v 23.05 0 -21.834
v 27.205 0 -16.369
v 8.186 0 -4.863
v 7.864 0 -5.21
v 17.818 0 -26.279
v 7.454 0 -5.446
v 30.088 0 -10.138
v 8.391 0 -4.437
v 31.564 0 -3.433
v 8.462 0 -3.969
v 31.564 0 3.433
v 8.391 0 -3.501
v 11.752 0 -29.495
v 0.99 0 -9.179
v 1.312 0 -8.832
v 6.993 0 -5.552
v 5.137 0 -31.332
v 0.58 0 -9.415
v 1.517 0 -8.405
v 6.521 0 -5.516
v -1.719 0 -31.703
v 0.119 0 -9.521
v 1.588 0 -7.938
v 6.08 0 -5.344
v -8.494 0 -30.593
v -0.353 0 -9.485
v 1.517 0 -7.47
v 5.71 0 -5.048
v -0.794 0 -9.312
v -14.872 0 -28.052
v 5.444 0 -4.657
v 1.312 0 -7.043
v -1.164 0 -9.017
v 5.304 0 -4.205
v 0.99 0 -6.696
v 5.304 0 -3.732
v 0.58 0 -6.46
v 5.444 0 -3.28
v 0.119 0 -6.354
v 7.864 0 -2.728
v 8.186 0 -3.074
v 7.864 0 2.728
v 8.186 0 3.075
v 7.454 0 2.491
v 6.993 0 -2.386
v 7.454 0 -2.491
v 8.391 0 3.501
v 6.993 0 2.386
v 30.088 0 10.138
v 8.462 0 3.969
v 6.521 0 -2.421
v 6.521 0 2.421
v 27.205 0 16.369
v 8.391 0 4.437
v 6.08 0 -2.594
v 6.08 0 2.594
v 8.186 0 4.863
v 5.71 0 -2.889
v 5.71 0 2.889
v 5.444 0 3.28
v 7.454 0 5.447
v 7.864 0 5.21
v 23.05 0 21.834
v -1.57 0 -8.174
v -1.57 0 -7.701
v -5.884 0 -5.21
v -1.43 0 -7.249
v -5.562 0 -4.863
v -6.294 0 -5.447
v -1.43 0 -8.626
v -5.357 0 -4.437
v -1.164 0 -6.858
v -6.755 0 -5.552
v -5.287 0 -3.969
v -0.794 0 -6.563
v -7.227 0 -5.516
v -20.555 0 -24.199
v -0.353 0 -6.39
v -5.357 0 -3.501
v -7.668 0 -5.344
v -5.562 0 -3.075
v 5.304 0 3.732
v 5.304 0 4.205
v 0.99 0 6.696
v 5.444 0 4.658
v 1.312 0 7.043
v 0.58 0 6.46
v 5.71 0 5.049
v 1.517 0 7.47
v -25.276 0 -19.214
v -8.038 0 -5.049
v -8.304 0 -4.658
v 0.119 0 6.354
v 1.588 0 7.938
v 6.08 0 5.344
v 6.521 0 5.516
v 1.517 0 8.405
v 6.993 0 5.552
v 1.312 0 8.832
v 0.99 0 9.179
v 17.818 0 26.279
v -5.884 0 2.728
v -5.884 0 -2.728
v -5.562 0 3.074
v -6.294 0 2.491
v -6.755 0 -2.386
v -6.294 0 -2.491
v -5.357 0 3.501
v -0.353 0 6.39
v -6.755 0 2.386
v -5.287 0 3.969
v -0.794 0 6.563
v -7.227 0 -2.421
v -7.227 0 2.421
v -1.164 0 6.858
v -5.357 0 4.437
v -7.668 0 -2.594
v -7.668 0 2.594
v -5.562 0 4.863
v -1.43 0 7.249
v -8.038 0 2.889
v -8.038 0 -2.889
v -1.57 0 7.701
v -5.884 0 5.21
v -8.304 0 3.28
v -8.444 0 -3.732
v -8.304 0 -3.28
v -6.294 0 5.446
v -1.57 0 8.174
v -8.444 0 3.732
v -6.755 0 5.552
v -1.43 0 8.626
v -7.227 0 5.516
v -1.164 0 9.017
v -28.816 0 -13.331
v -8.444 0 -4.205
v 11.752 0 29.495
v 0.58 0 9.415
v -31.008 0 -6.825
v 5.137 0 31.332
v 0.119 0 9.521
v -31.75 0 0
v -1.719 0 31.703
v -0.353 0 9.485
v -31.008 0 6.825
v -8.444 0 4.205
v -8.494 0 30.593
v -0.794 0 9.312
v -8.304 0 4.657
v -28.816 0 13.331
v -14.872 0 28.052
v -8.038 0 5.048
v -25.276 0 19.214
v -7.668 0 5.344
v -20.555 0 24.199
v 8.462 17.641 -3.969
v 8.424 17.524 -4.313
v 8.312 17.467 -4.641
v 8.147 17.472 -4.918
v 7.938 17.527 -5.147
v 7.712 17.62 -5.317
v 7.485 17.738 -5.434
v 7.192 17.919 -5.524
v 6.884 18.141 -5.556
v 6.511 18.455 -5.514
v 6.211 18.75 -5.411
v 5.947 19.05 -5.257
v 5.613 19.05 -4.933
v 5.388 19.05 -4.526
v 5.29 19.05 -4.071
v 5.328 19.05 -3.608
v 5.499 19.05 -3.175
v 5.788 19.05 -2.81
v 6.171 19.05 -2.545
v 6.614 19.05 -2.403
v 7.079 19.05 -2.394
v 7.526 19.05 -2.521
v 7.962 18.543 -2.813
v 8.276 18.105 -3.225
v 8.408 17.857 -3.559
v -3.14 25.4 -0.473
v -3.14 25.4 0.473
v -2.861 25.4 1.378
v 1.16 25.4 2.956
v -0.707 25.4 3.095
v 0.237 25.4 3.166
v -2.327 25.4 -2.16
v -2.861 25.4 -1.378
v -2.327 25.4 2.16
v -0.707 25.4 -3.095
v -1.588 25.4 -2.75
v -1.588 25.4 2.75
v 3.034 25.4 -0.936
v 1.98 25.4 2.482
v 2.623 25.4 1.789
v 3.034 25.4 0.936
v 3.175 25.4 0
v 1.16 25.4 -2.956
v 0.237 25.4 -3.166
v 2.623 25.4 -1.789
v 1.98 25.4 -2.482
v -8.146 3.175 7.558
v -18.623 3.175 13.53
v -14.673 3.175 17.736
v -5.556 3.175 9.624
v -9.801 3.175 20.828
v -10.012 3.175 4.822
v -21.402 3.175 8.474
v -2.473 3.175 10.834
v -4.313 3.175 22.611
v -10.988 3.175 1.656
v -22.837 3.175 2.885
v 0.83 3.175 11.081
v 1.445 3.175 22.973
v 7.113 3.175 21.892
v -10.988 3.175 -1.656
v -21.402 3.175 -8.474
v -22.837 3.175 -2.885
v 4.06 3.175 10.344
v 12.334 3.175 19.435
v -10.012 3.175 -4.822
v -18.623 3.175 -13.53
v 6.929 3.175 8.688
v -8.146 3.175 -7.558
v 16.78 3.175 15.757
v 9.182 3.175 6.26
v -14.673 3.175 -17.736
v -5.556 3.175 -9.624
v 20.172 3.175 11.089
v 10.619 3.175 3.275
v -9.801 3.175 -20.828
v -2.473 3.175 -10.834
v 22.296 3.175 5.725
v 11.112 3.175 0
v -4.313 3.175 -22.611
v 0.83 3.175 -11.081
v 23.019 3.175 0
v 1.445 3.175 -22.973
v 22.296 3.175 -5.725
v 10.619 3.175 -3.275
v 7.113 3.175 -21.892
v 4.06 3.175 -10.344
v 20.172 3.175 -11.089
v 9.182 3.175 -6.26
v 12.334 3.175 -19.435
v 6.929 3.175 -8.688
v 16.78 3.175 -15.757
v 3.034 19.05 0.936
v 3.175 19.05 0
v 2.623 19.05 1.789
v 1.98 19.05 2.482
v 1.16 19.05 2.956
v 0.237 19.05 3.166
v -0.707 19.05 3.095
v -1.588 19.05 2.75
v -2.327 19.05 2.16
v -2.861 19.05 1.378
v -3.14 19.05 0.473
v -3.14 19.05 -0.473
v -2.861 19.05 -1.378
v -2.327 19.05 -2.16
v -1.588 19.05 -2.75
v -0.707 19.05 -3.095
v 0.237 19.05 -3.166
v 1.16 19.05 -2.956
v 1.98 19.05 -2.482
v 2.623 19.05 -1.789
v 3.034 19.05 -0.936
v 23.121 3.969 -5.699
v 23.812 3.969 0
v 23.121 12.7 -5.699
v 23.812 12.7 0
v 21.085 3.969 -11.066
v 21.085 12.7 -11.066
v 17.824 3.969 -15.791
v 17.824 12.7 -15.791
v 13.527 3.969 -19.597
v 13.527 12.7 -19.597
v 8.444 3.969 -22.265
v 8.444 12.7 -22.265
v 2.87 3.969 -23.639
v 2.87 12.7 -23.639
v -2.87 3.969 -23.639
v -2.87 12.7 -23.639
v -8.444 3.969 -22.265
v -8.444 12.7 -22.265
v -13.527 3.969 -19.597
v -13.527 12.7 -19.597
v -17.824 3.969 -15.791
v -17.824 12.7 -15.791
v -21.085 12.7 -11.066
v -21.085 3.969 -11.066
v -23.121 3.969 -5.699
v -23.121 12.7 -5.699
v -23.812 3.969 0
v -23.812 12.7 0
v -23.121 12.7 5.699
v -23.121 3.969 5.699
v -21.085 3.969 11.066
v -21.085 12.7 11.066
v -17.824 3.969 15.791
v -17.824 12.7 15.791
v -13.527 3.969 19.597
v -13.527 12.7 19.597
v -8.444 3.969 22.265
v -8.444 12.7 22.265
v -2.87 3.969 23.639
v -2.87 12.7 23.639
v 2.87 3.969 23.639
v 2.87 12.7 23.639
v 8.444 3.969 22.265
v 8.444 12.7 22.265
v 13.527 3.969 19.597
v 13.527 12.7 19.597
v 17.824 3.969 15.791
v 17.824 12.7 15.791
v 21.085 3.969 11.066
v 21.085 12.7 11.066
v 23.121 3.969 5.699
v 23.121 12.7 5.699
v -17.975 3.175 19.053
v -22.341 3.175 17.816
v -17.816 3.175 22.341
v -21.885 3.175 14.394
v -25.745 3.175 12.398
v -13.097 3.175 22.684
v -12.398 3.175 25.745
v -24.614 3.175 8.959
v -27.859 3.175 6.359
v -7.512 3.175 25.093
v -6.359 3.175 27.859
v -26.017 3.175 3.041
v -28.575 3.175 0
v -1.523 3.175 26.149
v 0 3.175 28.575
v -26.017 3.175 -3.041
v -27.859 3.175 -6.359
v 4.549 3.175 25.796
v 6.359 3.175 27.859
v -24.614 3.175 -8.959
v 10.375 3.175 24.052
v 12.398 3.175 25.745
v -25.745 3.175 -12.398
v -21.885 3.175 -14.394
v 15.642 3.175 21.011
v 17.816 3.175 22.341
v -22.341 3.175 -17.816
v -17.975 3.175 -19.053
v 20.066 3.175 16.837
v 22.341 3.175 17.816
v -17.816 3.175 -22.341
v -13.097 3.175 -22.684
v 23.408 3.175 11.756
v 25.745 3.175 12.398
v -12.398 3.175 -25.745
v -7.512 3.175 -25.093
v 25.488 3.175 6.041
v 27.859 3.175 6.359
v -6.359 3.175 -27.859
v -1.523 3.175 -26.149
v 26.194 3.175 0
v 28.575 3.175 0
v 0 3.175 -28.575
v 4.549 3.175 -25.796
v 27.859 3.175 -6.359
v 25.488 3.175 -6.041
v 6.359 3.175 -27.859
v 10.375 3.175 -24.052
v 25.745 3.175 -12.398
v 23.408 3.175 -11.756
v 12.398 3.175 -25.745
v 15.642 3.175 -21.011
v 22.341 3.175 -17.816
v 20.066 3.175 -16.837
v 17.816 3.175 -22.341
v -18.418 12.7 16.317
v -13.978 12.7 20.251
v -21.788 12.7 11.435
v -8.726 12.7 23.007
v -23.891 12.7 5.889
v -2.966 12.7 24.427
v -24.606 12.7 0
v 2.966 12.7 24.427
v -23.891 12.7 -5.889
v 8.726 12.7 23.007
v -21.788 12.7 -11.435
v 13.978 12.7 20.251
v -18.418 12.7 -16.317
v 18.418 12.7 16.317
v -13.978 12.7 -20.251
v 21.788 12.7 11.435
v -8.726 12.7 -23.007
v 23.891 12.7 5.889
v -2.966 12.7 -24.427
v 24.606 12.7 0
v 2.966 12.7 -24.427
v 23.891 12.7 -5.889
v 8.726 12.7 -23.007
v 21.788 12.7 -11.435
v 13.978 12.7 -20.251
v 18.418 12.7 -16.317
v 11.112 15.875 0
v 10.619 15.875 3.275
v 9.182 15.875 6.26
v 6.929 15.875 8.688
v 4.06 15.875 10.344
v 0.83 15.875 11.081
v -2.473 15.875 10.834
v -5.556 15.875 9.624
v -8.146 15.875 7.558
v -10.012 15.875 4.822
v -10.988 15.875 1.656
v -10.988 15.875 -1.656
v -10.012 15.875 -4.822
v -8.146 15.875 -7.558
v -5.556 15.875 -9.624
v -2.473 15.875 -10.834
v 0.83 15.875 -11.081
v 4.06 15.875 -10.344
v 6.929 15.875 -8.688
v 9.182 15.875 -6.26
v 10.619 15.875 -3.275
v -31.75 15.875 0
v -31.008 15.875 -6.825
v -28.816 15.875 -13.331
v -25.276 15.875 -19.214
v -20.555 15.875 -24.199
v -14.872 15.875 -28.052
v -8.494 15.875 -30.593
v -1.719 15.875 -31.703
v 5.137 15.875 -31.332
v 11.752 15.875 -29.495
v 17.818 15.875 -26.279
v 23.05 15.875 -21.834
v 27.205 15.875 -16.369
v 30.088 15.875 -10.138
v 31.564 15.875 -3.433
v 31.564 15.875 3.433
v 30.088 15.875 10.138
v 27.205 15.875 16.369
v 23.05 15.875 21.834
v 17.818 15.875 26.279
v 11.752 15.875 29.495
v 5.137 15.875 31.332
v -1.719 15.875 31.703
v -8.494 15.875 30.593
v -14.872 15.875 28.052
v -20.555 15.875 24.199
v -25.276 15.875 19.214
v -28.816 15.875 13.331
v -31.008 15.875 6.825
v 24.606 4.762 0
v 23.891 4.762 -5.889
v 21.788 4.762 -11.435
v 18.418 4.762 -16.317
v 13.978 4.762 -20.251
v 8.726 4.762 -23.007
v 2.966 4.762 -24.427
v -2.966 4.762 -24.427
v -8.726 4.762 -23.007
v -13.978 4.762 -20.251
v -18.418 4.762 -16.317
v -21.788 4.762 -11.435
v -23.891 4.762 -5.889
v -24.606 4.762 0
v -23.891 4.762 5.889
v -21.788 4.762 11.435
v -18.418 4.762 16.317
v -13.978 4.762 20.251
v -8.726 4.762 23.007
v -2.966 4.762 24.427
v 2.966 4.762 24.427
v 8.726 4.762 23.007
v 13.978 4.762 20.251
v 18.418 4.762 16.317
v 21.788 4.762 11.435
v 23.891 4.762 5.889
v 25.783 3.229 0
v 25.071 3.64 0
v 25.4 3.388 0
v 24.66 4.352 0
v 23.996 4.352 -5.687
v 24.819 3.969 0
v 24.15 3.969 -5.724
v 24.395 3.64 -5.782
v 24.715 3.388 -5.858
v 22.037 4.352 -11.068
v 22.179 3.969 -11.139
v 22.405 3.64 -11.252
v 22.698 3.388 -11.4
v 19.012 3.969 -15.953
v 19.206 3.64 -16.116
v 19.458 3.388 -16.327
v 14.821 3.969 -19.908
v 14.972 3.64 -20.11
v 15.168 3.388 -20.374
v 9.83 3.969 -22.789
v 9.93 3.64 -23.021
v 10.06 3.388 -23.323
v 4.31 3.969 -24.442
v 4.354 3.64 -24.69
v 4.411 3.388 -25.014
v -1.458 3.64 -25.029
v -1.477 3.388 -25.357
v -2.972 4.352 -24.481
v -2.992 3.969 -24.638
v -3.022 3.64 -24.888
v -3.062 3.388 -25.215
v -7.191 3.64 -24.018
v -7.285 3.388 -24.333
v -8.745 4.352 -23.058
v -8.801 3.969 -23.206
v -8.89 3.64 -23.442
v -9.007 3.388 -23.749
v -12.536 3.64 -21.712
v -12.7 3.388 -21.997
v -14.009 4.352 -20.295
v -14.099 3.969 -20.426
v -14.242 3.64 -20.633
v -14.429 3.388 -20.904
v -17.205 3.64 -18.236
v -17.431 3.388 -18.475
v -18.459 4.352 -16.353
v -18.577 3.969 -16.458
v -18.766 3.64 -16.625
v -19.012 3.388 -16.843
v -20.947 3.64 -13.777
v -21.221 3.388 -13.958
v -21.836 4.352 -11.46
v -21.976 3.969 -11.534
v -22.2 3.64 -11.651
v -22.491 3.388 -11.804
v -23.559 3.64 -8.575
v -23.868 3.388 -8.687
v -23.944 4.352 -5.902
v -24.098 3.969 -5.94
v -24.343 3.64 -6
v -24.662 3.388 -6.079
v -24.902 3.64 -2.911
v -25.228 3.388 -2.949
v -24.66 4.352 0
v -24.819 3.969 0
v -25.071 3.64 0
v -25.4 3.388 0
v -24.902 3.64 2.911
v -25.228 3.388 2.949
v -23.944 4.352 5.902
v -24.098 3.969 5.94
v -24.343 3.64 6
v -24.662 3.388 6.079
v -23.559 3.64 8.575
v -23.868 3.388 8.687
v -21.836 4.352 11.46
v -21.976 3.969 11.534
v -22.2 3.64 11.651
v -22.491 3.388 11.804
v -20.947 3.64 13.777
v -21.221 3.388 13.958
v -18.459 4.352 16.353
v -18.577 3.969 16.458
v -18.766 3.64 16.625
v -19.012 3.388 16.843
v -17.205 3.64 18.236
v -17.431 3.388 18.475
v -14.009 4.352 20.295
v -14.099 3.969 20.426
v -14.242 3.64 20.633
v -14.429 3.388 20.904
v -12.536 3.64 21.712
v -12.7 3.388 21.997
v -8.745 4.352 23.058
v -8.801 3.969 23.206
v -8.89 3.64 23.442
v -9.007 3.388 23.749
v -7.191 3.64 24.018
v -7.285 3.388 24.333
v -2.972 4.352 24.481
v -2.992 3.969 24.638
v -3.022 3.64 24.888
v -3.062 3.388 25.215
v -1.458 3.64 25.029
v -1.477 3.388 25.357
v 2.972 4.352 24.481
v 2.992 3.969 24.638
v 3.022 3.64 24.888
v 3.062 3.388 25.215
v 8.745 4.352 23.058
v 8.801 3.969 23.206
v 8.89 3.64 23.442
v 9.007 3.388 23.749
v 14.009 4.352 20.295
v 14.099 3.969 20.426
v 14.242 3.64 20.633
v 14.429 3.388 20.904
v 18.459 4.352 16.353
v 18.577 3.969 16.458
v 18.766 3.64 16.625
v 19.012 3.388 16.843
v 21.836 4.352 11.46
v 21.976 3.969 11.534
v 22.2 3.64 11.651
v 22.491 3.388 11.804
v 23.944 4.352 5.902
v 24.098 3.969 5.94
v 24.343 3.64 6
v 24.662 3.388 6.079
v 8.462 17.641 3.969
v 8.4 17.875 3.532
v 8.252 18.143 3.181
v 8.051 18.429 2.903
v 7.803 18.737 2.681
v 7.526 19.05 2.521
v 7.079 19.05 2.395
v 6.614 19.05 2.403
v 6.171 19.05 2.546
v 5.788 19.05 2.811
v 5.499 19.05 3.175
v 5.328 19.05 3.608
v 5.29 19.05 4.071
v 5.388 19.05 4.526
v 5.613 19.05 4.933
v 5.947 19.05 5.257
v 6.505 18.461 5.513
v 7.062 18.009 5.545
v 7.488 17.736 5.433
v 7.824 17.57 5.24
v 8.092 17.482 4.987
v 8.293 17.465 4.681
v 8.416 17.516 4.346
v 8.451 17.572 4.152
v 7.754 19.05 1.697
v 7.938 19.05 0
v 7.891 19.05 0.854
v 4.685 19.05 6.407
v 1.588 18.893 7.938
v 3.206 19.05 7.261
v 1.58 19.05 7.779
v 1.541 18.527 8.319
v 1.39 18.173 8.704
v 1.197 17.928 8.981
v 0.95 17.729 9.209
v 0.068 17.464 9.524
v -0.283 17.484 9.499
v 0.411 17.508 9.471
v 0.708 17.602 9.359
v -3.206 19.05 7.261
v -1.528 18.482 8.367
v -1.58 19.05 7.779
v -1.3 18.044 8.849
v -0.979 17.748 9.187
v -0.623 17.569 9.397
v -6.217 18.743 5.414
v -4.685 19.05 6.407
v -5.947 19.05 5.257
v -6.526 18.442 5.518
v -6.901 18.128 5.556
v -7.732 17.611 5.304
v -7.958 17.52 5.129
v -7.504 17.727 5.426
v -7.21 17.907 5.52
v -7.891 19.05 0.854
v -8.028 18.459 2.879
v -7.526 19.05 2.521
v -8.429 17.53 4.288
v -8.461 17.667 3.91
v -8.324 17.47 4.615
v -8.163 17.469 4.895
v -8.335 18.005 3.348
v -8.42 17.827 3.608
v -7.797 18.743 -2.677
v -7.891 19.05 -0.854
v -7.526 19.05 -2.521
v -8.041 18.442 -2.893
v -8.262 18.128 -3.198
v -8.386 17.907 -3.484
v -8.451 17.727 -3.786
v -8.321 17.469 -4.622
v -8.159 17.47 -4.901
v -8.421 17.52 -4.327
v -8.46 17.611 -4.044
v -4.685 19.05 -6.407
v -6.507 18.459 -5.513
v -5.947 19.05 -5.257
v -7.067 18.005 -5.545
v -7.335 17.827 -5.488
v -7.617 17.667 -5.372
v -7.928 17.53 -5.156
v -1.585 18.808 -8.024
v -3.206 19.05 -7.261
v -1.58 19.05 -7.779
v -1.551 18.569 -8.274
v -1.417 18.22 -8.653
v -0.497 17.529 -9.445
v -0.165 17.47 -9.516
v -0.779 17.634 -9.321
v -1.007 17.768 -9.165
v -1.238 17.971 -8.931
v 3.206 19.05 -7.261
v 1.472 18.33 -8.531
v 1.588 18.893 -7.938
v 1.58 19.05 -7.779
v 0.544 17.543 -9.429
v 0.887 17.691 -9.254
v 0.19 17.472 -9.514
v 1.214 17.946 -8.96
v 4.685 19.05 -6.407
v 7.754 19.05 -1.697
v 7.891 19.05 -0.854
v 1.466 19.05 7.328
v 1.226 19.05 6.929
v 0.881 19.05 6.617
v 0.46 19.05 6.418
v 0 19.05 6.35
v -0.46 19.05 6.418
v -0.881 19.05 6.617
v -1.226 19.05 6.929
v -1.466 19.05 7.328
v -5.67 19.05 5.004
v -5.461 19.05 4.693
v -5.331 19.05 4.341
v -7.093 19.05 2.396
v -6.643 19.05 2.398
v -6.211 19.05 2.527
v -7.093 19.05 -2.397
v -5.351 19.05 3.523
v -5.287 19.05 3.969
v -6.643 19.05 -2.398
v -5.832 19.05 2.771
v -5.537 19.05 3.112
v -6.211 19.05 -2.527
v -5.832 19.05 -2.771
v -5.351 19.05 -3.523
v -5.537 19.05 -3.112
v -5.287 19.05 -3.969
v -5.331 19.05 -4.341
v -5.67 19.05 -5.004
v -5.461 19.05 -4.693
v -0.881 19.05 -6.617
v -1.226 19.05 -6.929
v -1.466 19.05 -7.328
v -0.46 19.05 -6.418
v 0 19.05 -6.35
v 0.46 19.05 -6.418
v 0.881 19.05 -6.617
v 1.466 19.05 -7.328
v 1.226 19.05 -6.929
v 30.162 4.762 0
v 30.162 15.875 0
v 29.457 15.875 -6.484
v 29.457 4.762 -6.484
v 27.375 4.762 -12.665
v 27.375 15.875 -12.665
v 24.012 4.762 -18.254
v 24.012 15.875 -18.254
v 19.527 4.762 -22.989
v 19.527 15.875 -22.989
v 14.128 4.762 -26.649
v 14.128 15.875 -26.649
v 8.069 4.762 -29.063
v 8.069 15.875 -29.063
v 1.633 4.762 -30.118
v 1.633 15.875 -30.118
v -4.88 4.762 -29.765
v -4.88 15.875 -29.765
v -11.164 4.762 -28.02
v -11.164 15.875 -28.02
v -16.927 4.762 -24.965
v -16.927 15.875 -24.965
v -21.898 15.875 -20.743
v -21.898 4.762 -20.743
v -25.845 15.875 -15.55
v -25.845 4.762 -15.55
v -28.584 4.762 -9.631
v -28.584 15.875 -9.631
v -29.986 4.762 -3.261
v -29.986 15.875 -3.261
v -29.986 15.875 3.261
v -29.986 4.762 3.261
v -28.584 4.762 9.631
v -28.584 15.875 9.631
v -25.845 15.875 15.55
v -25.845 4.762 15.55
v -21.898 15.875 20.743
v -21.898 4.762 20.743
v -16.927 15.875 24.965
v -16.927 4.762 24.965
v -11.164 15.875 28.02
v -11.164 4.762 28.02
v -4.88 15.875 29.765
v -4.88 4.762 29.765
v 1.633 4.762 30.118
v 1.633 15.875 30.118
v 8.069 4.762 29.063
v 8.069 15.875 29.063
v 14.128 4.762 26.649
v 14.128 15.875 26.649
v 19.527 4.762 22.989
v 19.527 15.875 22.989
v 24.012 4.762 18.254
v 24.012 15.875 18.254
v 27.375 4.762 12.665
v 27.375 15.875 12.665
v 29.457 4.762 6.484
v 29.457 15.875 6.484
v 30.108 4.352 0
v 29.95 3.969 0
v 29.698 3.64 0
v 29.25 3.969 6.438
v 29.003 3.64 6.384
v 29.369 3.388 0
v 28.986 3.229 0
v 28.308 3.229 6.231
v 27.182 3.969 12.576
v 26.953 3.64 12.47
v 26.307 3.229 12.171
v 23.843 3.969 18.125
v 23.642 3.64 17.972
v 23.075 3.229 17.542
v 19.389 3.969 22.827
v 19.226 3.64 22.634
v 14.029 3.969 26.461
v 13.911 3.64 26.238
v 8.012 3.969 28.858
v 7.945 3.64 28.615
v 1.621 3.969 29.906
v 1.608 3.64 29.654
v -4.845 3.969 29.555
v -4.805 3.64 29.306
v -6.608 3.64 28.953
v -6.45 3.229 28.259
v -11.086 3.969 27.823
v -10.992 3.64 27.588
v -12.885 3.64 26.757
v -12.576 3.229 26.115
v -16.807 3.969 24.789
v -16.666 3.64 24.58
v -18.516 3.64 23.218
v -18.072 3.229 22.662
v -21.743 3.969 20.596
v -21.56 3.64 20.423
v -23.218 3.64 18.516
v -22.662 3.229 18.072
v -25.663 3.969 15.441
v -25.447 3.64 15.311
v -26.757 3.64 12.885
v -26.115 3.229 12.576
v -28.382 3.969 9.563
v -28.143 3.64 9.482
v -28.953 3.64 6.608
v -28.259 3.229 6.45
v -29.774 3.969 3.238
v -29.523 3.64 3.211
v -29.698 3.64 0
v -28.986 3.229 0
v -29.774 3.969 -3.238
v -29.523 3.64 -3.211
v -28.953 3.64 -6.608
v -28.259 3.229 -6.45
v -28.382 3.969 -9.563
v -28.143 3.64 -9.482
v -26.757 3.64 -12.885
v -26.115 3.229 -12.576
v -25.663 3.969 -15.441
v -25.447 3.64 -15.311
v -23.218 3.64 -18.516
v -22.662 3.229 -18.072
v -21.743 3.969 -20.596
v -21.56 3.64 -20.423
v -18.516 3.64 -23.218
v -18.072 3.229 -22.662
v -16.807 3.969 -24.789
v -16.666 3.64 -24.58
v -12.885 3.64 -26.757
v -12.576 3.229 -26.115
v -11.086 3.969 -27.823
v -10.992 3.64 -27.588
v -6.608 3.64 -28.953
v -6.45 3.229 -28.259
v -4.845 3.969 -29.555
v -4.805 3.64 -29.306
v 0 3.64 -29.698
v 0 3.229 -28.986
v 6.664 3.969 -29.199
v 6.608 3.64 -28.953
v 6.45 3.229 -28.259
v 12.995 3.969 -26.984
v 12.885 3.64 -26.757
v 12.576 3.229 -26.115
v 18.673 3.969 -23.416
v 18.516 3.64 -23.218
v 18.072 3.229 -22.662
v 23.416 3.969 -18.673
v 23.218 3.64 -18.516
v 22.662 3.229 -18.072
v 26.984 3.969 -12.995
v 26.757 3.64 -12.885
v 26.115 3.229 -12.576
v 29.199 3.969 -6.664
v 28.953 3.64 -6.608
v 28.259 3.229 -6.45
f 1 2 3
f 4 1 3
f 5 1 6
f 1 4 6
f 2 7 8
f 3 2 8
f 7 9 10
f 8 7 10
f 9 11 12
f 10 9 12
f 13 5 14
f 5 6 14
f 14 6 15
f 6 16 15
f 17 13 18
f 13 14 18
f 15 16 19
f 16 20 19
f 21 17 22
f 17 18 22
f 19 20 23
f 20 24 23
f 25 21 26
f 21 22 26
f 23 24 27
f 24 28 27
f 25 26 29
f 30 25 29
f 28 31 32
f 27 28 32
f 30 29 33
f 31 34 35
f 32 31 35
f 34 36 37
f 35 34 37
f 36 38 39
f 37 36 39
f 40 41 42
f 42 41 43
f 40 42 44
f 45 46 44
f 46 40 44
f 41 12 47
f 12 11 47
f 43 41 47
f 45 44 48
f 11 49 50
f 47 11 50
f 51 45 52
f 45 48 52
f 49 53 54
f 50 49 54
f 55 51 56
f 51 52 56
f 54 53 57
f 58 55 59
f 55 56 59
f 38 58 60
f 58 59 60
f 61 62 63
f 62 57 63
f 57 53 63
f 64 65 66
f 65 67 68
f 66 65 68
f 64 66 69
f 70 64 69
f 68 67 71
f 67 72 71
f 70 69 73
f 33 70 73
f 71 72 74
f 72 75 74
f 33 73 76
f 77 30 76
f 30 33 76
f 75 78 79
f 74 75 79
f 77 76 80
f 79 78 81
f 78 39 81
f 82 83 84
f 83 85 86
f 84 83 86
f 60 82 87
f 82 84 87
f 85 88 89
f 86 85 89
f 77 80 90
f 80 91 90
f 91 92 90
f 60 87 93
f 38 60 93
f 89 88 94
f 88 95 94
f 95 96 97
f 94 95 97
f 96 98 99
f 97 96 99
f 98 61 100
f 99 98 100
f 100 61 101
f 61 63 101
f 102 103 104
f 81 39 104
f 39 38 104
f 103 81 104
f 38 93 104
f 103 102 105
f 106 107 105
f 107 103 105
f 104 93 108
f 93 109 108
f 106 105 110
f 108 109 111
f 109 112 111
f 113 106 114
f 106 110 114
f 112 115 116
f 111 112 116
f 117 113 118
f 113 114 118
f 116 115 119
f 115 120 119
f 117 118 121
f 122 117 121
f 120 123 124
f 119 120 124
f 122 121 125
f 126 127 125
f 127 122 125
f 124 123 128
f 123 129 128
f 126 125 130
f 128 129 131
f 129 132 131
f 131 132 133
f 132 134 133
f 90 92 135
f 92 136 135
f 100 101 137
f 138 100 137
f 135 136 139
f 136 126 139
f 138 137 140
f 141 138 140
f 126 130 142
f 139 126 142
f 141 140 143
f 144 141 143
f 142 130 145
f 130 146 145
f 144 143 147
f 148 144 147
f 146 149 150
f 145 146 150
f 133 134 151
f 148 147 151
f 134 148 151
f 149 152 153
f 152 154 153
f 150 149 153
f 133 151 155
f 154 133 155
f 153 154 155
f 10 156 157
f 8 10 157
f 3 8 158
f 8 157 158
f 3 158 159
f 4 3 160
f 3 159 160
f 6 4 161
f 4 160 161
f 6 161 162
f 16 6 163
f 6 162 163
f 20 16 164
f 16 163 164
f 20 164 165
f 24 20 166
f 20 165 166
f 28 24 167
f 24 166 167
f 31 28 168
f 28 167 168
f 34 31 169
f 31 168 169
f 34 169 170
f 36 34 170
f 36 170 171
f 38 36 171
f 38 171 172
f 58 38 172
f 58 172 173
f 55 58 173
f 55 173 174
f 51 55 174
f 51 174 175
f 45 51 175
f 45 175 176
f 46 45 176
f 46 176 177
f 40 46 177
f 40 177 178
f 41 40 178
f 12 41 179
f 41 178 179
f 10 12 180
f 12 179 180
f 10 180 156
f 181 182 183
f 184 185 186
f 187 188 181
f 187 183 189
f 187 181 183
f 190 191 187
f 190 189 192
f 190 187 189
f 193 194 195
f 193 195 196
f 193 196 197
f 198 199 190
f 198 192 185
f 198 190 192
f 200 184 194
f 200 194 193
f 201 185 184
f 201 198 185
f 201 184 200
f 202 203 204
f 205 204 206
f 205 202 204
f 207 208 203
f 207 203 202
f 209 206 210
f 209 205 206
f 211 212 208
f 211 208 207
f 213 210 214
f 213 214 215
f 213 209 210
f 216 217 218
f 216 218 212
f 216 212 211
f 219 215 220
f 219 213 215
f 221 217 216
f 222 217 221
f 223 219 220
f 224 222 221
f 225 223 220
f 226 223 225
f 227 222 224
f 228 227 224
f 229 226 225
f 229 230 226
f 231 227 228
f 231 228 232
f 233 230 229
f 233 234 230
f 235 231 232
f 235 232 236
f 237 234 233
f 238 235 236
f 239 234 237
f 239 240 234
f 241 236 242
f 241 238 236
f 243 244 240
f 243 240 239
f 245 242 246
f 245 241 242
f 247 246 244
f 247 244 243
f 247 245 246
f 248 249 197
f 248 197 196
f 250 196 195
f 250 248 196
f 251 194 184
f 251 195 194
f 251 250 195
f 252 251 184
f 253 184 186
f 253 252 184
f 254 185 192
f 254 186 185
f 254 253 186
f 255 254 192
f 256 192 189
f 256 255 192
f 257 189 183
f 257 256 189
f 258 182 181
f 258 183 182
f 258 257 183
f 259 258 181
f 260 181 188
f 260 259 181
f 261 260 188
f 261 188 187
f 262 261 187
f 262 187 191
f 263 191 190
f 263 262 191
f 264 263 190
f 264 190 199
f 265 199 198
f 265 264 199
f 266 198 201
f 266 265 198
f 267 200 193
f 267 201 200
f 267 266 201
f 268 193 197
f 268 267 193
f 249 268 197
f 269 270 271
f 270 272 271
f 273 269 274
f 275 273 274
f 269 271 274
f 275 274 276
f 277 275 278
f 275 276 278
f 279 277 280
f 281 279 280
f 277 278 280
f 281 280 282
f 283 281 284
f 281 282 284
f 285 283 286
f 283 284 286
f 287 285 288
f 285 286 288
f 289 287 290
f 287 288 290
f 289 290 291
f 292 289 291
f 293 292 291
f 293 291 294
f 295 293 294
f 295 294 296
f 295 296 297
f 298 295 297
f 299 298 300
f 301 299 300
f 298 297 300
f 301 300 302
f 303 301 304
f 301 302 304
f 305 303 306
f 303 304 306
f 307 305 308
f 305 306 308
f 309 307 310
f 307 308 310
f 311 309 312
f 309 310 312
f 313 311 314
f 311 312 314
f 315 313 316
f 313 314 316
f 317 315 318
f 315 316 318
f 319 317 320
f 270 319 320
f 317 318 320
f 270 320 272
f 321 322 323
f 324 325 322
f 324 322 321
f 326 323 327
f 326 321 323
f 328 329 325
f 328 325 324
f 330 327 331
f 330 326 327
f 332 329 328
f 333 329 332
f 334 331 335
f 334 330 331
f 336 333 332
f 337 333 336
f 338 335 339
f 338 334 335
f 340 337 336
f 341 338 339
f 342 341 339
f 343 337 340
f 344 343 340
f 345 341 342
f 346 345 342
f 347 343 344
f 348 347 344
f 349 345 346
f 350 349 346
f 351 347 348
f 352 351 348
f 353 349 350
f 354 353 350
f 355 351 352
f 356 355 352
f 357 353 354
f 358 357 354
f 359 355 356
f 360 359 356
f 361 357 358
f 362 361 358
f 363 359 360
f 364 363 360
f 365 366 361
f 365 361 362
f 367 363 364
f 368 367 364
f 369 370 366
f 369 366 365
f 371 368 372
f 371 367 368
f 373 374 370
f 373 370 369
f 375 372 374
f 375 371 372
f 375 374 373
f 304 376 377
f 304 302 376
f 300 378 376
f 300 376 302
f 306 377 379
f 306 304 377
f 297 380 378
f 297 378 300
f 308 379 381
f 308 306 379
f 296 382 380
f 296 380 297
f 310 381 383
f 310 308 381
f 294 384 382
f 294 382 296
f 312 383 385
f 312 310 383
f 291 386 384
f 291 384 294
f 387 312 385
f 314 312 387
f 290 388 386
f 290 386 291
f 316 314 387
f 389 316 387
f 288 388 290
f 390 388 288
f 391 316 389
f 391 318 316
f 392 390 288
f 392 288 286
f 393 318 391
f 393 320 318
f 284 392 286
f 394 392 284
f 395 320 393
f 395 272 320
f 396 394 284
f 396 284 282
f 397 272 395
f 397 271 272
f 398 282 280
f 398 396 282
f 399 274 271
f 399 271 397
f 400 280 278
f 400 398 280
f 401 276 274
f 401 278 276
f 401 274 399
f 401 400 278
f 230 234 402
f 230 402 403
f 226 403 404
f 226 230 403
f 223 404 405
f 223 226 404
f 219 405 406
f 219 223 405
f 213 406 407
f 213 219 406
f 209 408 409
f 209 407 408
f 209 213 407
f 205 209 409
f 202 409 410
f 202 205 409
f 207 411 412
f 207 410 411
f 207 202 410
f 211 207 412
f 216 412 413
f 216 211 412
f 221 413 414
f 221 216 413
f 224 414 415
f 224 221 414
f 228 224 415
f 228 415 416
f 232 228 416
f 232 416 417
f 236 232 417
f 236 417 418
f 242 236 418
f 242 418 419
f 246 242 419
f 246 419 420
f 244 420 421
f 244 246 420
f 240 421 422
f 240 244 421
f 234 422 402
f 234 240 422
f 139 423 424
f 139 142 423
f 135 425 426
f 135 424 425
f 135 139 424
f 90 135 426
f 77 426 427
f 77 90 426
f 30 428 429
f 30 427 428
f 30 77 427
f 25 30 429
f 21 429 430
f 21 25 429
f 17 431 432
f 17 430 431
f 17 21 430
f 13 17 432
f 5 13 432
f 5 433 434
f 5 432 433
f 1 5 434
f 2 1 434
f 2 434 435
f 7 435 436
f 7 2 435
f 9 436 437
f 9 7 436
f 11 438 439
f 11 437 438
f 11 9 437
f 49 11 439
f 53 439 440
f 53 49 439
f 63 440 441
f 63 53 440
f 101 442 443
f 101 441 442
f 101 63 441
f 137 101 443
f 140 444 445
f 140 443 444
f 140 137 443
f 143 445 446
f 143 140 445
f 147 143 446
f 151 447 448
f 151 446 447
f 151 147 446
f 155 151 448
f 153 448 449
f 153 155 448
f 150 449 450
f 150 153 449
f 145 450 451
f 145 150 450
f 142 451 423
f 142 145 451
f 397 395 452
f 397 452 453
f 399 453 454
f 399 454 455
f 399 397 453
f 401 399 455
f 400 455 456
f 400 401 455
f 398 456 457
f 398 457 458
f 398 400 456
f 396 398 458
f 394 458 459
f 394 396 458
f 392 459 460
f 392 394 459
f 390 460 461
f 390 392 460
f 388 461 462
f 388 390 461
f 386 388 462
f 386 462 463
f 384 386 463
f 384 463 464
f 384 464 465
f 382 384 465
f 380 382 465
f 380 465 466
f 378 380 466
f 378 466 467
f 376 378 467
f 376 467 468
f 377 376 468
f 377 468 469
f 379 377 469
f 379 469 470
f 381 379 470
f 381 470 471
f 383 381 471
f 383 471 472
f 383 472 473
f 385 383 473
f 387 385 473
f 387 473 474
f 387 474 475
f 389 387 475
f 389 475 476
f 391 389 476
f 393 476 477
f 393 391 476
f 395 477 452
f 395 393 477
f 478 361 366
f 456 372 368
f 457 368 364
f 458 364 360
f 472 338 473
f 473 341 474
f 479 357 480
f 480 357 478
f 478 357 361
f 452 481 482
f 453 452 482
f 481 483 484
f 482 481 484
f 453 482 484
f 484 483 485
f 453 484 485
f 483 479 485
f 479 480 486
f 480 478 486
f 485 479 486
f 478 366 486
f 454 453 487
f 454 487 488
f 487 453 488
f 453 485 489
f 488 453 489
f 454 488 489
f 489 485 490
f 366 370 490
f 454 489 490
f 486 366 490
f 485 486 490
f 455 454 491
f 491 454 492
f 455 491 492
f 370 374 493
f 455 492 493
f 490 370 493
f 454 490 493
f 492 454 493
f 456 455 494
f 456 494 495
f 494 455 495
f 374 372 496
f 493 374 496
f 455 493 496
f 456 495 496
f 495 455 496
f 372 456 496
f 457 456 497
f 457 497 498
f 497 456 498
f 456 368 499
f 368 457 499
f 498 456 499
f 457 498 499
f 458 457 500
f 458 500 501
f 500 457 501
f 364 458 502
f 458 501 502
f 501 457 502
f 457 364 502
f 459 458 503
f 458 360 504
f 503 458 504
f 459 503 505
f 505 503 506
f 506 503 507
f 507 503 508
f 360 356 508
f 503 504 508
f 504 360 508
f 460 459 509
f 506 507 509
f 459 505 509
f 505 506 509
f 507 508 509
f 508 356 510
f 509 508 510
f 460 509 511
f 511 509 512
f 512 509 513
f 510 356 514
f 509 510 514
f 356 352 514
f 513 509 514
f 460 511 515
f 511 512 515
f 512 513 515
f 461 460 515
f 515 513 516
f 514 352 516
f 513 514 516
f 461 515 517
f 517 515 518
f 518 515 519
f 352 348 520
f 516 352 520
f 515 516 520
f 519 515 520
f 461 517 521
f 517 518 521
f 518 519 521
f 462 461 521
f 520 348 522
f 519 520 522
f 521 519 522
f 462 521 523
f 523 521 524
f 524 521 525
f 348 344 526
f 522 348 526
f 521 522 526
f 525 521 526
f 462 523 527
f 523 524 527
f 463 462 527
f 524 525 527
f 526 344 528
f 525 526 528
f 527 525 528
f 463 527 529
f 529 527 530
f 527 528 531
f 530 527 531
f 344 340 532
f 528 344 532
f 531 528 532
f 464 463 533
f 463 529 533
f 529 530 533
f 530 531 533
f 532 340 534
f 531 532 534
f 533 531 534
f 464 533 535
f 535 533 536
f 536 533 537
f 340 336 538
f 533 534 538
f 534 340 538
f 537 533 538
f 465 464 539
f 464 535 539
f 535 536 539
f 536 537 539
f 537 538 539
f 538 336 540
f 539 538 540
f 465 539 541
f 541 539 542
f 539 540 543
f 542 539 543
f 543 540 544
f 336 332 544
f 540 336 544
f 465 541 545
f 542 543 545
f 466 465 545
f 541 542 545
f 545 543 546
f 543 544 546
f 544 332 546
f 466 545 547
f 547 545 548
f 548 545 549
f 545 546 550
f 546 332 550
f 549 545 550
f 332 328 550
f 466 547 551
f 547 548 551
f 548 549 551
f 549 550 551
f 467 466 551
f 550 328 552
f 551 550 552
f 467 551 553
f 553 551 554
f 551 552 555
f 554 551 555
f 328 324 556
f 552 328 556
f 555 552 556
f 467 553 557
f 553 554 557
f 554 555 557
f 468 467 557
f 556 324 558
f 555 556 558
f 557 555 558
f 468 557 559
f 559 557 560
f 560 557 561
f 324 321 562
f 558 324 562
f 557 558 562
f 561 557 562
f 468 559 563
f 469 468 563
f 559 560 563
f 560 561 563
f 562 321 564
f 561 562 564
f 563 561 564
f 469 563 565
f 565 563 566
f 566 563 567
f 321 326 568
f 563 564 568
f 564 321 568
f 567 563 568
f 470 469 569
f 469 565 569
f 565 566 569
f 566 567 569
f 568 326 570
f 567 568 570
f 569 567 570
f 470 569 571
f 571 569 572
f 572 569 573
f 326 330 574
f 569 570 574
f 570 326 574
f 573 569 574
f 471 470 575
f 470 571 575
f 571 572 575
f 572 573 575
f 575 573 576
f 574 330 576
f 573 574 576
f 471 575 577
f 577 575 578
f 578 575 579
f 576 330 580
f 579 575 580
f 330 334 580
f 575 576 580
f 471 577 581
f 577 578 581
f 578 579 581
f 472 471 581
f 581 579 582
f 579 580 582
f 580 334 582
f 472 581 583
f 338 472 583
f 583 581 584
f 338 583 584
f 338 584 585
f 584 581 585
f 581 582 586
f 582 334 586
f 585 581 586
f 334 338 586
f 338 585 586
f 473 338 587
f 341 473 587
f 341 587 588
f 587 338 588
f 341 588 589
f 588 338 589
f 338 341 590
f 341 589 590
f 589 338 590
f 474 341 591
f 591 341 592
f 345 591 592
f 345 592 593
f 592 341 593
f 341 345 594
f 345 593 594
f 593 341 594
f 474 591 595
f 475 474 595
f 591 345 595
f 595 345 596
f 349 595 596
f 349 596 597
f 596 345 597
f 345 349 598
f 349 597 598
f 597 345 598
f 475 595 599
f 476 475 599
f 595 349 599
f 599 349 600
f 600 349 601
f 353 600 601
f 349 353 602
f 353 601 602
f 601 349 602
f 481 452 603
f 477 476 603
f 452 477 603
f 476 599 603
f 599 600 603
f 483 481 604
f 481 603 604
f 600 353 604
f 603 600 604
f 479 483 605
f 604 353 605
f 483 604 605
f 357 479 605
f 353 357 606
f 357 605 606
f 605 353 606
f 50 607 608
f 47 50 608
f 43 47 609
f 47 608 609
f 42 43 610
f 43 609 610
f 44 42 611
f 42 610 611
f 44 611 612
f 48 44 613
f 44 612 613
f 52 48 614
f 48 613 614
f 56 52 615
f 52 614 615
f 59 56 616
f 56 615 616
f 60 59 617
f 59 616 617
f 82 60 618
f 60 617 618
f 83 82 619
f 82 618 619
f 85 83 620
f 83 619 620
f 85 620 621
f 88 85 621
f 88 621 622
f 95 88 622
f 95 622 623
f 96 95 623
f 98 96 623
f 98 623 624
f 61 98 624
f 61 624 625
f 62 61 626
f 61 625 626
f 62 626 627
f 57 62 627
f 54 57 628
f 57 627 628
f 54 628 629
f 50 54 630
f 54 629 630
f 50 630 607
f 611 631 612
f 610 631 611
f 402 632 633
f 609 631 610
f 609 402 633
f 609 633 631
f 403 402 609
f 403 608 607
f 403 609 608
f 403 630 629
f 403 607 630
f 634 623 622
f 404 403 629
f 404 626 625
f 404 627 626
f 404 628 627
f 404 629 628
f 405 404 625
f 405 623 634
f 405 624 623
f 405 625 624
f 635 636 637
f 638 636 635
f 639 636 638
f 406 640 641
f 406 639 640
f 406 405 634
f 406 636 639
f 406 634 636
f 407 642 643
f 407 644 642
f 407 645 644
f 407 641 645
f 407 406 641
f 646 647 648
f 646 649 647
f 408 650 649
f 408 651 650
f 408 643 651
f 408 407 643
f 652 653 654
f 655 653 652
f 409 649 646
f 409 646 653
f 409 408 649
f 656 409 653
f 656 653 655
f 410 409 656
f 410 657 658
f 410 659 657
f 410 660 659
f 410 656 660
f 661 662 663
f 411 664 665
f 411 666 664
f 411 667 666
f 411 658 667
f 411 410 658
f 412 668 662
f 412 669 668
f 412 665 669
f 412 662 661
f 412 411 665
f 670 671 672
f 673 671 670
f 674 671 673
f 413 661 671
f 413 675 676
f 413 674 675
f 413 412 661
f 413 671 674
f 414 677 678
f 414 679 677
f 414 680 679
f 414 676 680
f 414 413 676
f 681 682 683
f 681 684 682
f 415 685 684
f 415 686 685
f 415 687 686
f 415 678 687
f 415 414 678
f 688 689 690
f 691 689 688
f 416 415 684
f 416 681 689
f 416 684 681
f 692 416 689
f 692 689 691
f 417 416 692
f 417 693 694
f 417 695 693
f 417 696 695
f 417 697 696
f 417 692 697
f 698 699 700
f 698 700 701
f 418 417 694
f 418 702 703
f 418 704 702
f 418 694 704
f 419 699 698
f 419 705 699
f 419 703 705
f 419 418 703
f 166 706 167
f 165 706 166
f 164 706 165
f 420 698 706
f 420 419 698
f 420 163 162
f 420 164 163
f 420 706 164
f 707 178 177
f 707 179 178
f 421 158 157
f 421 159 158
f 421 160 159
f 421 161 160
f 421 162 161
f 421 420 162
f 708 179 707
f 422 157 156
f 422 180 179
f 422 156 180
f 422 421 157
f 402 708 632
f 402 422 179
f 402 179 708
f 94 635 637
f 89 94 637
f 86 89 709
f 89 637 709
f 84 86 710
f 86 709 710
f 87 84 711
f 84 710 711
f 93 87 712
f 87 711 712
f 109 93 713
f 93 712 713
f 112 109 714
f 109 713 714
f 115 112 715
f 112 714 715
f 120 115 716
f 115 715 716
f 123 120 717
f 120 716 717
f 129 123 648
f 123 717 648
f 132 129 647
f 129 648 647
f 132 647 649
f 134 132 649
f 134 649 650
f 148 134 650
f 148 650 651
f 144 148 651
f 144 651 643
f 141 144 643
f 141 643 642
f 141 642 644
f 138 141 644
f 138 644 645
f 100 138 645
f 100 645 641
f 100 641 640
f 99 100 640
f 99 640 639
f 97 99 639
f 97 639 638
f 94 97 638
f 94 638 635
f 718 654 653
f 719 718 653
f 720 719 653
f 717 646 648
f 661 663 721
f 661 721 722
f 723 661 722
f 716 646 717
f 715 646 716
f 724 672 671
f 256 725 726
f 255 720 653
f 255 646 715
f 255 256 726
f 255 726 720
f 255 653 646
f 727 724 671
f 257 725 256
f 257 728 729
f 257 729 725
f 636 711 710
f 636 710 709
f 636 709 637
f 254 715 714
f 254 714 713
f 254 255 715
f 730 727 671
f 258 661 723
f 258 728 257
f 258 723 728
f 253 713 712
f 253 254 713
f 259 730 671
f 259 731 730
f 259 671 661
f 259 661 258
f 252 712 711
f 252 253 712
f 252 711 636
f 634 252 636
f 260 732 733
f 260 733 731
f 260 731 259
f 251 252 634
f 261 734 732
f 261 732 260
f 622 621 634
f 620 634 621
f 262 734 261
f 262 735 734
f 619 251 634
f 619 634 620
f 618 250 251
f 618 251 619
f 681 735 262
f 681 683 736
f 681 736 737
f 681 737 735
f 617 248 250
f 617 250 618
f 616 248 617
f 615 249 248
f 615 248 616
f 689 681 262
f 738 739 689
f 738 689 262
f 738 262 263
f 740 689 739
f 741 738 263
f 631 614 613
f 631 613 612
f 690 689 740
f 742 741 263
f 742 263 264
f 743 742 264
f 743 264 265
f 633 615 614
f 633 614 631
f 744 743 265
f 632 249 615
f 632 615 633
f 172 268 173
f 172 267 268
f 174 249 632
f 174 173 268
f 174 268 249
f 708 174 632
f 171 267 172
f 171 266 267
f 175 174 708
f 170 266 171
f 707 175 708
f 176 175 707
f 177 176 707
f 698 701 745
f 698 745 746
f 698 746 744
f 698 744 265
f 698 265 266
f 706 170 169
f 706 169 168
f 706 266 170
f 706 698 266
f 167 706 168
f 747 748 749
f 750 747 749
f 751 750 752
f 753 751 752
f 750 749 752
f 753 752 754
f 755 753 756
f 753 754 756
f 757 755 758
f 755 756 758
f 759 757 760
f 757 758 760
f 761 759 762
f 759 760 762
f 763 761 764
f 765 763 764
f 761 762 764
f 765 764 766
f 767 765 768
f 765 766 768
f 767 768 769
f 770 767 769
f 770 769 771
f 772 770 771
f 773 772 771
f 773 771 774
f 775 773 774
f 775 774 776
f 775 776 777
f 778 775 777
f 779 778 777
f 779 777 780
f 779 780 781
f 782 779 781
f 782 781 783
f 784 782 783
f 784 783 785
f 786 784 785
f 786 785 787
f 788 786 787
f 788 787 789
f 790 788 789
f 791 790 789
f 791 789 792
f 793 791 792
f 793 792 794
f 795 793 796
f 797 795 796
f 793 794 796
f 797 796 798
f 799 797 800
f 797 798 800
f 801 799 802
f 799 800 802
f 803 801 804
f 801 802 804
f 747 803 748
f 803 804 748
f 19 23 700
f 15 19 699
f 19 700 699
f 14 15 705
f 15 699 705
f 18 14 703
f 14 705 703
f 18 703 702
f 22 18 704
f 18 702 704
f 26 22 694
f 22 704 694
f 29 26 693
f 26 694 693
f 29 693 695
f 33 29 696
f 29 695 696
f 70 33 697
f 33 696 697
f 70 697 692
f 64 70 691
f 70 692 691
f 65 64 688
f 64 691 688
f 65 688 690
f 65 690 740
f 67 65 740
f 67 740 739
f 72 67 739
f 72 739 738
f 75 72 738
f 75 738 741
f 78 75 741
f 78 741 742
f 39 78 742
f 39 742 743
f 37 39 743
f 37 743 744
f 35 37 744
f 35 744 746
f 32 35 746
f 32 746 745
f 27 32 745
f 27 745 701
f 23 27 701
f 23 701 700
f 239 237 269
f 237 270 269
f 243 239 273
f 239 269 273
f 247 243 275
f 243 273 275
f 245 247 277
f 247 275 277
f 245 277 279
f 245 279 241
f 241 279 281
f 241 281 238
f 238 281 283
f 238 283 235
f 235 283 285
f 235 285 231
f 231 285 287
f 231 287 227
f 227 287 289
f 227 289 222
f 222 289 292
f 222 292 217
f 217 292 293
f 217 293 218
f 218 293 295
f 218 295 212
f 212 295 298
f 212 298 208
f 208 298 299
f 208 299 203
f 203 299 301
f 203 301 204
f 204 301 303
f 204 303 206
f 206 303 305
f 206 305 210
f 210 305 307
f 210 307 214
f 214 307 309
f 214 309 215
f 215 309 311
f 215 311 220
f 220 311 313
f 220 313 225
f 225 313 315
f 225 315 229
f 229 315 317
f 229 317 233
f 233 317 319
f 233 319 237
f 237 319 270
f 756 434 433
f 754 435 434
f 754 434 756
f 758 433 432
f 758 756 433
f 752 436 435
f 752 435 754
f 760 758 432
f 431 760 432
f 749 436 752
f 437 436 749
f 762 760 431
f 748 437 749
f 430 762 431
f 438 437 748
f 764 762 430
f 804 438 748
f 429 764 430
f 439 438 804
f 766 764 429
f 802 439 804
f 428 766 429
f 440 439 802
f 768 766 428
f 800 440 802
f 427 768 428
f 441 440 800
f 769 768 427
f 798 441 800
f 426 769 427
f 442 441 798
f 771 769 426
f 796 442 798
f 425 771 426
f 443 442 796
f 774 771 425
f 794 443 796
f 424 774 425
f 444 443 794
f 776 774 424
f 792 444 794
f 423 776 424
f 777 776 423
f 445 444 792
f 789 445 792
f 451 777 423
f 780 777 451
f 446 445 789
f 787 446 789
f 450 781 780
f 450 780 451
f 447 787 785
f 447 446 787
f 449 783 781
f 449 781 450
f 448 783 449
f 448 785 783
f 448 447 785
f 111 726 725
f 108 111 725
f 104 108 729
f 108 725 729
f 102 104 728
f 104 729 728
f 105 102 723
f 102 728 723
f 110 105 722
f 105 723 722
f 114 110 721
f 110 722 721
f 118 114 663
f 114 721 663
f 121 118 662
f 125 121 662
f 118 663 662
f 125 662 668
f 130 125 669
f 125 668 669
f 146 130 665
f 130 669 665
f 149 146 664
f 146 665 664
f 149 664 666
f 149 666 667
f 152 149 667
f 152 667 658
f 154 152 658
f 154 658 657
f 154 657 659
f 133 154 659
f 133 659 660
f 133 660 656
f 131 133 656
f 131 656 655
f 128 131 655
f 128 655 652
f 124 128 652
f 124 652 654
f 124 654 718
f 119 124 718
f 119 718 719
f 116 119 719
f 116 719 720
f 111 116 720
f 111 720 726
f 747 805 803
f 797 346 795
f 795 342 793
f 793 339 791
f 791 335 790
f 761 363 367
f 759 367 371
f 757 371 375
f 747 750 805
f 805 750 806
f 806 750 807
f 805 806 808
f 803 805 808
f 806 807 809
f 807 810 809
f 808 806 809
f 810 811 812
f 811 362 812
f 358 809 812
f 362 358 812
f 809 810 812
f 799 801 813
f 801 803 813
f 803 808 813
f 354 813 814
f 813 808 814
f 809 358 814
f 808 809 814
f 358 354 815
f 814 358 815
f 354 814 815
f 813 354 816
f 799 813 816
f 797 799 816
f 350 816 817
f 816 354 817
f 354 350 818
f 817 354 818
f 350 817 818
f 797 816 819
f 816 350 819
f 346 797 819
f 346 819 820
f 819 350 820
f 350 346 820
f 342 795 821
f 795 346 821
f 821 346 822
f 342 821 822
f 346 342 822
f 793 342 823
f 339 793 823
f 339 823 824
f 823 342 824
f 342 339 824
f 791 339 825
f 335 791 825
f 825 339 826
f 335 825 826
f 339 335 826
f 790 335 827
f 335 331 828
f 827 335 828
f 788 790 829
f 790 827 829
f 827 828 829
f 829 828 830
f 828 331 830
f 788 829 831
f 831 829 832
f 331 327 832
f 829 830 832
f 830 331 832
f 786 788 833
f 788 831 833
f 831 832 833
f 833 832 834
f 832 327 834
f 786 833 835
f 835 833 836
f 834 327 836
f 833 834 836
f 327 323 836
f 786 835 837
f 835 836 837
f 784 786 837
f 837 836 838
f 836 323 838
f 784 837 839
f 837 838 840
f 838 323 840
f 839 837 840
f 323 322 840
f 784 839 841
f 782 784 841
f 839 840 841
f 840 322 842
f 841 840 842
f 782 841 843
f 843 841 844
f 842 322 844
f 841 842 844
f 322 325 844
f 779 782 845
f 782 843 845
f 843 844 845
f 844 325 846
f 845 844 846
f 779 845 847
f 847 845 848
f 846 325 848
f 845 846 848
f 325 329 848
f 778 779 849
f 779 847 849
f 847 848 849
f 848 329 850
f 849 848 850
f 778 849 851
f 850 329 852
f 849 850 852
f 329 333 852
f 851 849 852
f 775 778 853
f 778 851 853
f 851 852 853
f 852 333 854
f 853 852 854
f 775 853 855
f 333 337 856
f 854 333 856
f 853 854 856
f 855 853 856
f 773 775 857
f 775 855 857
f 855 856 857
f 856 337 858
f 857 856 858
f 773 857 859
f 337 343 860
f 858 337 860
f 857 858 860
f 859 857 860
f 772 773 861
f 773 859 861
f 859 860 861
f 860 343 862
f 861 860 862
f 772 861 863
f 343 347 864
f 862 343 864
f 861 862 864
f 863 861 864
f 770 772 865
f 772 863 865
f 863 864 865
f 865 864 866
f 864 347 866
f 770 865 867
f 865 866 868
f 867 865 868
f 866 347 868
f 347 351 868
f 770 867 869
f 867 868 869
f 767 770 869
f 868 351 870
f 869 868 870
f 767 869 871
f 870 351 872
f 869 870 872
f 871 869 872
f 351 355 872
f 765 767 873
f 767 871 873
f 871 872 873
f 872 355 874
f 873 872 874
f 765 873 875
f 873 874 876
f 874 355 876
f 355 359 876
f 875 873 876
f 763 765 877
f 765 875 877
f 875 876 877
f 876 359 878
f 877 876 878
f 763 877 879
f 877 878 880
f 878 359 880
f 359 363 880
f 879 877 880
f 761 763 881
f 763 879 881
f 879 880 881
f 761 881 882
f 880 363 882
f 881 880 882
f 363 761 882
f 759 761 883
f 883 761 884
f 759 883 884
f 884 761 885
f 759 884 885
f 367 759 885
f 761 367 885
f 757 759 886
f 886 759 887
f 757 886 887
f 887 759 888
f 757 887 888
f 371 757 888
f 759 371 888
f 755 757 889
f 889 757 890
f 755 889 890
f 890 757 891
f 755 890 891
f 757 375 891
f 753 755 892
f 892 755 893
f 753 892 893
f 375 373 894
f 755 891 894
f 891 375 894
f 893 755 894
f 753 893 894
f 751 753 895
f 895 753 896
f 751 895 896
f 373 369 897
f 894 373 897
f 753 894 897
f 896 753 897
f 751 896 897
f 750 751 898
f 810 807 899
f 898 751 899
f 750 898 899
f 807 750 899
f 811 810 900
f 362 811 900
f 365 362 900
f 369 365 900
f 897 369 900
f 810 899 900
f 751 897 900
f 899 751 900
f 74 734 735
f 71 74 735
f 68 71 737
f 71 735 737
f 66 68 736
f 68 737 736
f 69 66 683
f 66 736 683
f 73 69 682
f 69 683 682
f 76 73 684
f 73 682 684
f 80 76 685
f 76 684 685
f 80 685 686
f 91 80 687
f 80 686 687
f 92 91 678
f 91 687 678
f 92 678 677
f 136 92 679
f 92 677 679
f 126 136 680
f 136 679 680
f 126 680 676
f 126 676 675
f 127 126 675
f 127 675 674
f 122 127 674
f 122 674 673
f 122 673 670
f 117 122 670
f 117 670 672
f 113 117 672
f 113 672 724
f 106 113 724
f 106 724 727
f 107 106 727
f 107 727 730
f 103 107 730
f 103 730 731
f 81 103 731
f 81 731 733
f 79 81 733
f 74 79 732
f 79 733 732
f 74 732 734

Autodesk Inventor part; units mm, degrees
ref_plane "YZ Plane" through (0, 0, 0) normal (1, 0, 0) x (0, 1, 0)
ref_plane "XZ Plane" through (0, 0, 0) normal (0, 1, 0) x (-1, 0, 0)
ref_plane "XY Plane" through (0, 0, 0) normal (0, 0, 1) x (1, 0, 0)
sketch "Sketch1" plane through (0, 0, 0) normal (0, 1, 0) x (-1, 0, 0)
  point P0 (0, 0)
sketch "Sketch2" plane through (0, 0, 0) normal (0, 1, 0) x (-1, 0, 0)
  circle A0 centre (0, 0) radius 31.75
  dimension "d0" = 63.5
extrude "Extrusion1" add sketch "Sketch2" along normal blind 15.875
sketch "Sketch3" plane through (0, 15.875, 0) normal (0, 1, 0) x (1, 0, 0)
  circle A0 centre (0, 0) radius 23.8125
  dimension "d3" = 47.625
extrude "Extrusion2" cut sketch "Sketch3" against normal blind 12.7
chamfer "Chamfer1" distance 0.7937 angle 45 1 edges at (-23.8125, 3.175, 0)
sketch "Sketch4" plane through (0, 3.175, 0) normal (0, 1, 0) x (1, 0, 0)
  circle A0 centre (0, 0) radius 11.1125
  dimension "d12" = 22.225
extrude "Extrusion3" add sketch "Sketch4" along normal blind 15.875
sketch "Sketch5" plane through (0, 19.05, 0) normal (0, 1, 0) x (1, 0, 0)
  circle A0 centre (0, 0) radius 3.175
  dimension "d15" = 6.35
extrude "Extrusion4" add sketch "Sketch5" along normal blind 6.35
chamfer "Chamfer3" distance 3.175 angle 45 1 edges at (-11.1125, 19.05, 0)
sketch "Sketch6" plane through (0, 19.05, 0) normal (0, 1, 0) x (1, 0, 0)
  circle A0 centre (0, 0) radius 7.9375 construction
  circle A1 centre (0, 0) radius 7.9375 projected
  circle A2 centre (0, 7.9375) radius 1.5875
  line L0 (0, 0) -> (0, 7.9375) construction
  circle A3 centre (-6.8741, 3.9688) radius 1.5875
  circle A4 centre (-6.8741, -3.9687) radius 1.5875
  circle A5 centre (0, -7.9375) radius 1.5875
  circle A6 centre (6.8741, -3.9688) radius 1.5875
  circle A7 centre (6.8741, 3.9687) radius 1.5875
  dimension "d21" = 15.875
  dimension "d22" = 3.175
  dimension "d25" = 360
extrude "Extrusion5" cut sketch "Sketch6" against normal through all contours A7 A1 | A1 A7 | A6 A1 | A1 A6 | A2 A1 | A1 A2 | A5 A1 | A1 A5 | A3 A1 | A1 A3 | A4 A1 | A1 A4
sketch "Sketch8" plane through (0, 15.875, 0) normal (0, 1, 0) x (1, 0, 0)
  circle A0 centre (0, 0) radius 23.8125
  circle A1 centre (0, 0) radius 24.6063
  circle A2 centre (0, 0) radius 23.8125 projected
  circle A3 centre (0, 0) radius 31.75 projected
  circle A4 centre (0, 0) radius 3.175 projected
  circle A5 centre (0, 0) radius 30.1625
  dimension "d38" = 0.7937
  dimension "d39" = 47.625
  dimension "d40" = 1.5875
extrude "Extrusion7" cut sketch "Sketch8" against normal blind 12.7 contours A5
fillet "Fillet1" radius 1.5875 2 edges at (-24.6063, 3.175, 0) (-30.1625, 3.175, 0)
sketch "Sketch9" plane through (0, 15.875, 0) normal (0, 1, 0) x (1, 0, 0)
  circle A0 centre (0, 0) radius 19.05
  circle A1 centre (0, 0) radius 25.4
  dimension "d44" = 38.1
  dimension "d45" = 50.8
extrude "Extrusion8" cut sketch "Sketch9" against normal blind 3.175
properties part number "Wheel Mold"
